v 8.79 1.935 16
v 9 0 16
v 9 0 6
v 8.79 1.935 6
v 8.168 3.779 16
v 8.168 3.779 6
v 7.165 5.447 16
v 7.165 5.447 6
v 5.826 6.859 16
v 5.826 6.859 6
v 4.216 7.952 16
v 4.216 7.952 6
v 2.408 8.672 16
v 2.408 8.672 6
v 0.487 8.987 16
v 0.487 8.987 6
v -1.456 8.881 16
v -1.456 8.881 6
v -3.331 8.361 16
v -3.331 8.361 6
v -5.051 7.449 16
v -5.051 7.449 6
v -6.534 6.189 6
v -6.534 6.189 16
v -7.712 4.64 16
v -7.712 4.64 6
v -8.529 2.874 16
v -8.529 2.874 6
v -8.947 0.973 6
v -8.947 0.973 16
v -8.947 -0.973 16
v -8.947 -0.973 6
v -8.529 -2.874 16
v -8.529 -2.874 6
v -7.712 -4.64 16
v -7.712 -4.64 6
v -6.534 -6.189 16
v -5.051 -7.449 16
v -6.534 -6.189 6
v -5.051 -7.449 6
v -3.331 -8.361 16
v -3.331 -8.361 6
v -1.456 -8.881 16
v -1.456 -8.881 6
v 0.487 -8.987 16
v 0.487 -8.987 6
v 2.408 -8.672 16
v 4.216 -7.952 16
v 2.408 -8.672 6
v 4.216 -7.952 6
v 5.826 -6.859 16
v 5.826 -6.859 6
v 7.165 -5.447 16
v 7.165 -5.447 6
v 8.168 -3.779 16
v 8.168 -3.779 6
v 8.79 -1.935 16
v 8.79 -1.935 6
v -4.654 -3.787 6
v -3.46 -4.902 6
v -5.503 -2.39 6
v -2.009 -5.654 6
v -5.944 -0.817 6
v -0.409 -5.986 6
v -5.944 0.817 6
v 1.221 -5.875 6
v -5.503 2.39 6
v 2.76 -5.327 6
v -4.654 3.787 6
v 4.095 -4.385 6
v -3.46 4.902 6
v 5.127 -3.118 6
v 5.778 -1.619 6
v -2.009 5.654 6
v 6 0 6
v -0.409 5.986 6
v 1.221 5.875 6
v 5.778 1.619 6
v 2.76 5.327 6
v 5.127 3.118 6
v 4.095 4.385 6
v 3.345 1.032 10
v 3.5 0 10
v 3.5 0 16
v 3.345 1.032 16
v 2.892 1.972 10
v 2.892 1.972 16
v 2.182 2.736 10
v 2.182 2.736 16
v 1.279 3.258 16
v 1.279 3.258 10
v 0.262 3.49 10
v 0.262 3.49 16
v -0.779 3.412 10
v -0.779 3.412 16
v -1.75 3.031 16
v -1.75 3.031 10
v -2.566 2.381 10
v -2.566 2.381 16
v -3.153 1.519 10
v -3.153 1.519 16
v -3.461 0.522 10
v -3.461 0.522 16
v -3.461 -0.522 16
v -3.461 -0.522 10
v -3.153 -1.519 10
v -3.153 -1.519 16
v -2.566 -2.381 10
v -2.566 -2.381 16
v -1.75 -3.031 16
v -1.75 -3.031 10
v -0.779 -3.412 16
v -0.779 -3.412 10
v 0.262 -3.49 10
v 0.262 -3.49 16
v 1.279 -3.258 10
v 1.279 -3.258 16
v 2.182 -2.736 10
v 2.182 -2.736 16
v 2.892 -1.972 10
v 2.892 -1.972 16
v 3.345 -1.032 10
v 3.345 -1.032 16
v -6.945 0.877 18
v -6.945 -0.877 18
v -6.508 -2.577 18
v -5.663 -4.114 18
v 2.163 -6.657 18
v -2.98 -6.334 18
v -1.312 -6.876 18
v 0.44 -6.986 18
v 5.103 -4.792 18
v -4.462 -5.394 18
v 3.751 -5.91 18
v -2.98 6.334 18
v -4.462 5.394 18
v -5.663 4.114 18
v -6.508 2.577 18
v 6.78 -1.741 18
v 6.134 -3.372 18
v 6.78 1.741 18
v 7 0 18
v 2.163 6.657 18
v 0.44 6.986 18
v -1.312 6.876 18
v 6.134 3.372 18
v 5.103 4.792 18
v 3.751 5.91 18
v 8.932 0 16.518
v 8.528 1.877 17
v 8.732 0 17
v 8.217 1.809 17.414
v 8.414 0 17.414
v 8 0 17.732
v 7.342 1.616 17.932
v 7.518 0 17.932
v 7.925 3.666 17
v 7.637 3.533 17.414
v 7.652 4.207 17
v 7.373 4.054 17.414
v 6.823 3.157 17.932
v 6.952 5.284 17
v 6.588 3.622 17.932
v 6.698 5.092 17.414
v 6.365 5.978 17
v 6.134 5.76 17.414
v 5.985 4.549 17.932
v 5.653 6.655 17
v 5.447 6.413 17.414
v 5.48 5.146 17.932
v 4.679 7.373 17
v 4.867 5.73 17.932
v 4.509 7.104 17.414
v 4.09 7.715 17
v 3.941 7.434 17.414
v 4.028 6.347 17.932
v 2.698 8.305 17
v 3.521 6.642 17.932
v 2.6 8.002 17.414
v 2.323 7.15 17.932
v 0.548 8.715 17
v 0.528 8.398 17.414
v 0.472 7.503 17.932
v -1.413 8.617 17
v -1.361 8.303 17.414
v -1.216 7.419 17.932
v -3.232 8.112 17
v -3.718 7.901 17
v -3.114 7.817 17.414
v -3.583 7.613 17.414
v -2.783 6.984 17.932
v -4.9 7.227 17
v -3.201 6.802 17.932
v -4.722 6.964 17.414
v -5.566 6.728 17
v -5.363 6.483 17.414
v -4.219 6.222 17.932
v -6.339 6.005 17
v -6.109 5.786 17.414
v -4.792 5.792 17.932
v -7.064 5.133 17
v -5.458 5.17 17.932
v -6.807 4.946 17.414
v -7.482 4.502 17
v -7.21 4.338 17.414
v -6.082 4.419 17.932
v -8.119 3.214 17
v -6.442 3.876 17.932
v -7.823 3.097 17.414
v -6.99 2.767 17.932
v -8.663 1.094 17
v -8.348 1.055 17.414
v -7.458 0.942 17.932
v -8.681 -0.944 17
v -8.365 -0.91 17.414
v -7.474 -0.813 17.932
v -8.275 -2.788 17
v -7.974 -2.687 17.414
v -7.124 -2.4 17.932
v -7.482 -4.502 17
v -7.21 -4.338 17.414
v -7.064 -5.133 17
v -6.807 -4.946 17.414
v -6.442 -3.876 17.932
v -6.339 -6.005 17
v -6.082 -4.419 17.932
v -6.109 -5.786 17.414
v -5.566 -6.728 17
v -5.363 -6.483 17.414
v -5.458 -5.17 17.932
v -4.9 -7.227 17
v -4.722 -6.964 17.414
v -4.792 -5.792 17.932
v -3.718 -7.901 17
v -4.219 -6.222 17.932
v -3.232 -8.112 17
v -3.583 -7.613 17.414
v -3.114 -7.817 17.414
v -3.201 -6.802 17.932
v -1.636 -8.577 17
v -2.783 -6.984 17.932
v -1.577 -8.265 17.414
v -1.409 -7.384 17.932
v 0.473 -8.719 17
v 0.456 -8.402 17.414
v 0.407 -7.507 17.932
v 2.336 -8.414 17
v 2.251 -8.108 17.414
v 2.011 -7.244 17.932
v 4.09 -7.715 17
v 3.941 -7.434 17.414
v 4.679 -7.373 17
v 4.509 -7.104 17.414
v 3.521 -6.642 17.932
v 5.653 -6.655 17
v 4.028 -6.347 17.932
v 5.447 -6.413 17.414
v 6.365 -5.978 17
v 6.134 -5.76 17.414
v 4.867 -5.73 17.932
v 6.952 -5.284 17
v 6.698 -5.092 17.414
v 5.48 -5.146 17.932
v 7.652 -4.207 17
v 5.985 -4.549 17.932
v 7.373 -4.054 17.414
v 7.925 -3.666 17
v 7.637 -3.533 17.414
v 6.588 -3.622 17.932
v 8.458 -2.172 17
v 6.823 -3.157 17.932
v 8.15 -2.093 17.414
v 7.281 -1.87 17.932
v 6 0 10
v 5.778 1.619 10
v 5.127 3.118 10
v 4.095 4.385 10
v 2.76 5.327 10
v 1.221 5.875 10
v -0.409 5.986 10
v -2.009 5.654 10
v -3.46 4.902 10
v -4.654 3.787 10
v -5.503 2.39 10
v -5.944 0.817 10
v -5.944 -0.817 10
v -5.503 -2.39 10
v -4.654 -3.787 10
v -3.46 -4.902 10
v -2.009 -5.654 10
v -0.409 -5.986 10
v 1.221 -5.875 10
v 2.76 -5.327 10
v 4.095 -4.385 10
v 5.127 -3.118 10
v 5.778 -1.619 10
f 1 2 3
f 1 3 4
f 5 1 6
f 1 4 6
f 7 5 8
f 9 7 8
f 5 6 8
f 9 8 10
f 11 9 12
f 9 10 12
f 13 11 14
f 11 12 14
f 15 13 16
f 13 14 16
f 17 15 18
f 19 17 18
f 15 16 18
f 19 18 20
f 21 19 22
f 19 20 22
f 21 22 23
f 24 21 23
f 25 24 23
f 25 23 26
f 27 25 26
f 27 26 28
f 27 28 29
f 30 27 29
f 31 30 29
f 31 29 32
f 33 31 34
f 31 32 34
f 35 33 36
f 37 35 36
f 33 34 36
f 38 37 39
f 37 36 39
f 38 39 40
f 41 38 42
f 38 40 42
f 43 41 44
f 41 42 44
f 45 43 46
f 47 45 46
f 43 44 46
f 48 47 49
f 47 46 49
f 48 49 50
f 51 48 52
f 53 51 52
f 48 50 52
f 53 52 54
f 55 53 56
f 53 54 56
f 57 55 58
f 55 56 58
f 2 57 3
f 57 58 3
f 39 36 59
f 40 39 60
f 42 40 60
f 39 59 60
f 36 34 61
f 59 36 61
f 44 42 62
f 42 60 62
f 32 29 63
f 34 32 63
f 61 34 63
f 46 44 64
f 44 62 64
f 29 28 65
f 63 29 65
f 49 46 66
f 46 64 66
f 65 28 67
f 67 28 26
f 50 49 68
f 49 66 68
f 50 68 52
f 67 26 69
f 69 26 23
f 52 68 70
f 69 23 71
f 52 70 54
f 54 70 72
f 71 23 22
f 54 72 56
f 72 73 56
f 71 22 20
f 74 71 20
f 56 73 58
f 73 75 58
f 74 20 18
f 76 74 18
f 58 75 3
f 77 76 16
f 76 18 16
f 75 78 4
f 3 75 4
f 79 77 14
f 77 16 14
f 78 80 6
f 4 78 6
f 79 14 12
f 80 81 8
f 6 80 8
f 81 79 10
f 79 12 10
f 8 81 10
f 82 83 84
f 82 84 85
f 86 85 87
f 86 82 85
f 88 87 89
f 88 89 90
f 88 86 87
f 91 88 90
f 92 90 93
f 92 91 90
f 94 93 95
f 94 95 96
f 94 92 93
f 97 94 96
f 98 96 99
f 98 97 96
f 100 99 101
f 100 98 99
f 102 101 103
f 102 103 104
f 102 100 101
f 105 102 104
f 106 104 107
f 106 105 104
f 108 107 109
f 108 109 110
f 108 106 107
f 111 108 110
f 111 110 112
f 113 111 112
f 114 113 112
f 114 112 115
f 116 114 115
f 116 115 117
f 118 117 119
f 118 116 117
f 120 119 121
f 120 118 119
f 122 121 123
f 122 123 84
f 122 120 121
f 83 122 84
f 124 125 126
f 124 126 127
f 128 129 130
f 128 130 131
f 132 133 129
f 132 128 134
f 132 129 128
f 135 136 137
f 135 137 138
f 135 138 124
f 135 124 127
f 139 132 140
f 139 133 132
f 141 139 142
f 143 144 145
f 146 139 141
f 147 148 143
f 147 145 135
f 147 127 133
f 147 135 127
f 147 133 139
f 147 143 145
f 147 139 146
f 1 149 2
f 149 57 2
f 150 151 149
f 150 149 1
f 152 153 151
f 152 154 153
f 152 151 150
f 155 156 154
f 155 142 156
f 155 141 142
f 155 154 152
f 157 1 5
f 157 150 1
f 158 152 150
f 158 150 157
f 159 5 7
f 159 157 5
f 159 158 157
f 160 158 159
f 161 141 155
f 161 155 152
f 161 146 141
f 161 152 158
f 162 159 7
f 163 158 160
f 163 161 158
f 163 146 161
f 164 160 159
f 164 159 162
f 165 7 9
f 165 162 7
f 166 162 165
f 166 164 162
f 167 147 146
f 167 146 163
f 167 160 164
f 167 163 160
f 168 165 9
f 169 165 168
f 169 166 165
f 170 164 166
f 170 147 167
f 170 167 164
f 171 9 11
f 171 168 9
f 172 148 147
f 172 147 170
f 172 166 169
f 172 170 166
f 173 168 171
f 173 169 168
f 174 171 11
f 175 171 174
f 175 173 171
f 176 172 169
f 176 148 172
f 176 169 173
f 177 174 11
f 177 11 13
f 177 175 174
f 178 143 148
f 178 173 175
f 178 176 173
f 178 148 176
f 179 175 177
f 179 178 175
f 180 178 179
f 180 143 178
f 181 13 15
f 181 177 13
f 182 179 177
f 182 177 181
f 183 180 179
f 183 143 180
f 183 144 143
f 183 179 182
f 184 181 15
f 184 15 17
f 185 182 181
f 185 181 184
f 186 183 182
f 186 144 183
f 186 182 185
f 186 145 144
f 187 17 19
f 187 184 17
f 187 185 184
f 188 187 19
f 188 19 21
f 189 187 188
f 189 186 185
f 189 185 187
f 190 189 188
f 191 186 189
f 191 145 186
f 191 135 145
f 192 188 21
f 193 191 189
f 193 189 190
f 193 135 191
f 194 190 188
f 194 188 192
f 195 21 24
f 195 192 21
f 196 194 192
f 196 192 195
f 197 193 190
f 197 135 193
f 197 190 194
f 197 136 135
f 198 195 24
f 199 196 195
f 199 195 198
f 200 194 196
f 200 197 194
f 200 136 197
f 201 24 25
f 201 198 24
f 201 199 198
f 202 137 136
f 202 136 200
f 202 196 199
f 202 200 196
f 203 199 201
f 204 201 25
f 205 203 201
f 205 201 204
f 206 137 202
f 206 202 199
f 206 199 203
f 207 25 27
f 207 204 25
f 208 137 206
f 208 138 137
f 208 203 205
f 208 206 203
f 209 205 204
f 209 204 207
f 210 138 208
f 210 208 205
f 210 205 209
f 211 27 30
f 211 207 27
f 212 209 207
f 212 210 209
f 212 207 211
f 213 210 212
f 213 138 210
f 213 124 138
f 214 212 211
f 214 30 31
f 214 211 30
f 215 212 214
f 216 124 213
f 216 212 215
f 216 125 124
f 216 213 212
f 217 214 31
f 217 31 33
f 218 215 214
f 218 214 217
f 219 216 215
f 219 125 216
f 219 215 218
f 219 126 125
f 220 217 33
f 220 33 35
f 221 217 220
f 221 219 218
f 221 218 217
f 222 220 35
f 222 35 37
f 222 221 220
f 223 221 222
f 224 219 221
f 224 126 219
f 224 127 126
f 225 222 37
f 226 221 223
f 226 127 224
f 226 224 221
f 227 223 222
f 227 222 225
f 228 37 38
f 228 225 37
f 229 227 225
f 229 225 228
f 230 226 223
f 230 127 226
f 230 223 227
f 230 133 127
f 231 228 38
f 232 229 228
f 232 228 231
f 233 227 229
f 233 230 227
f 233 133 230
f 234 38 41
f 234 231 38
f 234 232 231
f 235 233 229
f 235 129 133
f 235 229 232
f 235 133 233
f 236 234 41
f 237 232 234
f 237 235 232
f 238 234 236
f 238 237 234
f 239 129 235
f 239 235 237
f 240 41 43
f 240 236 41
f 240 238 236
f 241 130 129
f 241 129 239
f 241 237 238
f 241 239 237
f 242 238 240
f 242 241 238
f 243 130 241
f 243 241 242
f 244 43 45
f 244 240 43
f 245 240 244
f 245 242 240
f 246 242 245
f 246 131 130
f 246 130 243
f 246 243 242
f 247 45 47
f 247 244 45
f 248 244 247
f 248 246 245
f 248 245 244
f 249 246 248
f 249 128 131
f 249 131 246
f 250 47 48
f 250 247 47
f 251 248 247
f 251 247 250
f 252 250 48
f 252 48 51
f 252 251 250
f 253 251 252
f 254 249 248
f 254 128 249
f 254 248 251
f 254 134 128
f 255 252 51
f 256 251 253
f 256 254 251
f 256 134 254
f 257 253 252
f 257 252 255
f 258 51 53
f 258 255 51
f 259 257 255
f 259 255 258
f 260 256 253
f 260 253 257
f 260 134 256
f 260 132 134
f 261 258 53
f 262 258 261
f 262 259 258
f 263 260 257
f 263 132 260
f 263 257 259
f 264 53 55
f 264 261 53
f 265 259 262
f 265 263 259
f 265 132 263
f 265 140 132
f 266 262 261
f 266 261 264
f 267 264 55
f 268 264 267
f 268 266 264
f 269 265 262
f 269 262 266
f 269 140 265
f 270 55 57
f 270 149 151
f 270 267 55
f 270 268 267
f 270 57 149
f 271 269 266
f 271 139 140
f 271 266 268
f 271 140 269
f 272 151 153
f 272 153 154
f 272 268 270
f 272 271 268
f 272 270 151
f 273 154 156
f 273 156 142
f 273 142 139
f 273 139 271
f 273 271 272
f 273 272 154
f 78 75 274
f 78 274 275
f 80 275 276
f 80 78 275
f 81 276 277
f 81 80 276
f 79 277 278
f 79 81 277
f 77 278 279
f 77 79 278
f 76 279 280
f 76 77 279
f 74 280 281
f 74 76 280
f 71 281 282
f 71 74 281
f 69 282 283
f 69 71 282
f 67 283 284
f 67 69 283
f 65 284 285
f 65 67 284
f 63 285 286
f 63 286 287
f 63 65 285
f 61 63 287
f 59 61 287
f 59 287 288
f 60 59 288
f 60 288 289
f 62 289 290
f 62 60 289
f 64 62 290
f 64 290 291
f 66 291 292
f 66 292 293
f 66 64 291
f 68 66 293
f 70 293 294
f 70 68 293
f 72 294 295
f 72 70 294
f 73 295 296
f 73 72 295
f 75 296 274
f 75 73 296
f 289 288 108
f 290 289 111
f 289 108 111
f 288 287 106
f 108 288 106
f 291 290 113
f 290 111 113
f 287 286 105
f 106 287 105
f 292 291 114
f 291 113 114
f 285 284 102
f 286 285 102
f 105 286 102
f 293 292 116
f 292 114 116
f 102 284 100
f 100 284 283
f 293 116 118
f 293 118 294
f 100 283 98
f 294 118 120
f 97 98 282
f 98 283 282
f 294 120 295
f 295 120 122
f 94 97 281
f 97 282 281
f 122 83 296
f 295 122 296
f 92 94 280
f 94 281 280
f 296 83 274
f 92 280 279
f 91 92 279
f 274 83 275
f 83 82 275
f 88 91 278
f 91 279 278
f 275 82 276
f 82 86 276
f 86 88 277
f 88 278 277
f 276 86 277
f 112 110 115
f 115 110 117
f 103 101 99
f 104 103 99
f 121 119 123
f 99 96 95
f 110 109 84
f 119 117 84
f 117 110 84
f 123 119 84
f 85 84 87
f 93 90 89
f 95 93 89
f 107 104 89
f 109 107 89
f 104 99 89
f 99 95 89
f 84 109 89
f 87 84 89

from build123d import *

# Parameters (mm, degrees)
CYLINDER021_R     = 3.5
CYLINDER021_DEPTH = 6
CYLINDER017_R     = 6
CYLINDER017_DEPTH = 4
CYLINDER015_R     = 9
CYLINDER015_DEPTH = 12
FILLET012_R       = 2


with BuildPart() as knob_cut003:
    # Cylinder021 → Cylinder021 (new body)
    with BuildSketch(Plane.XY.offset(10)):
        Circle(CYLINDER021_R)
    extrude(amount=CYLINDER021_DEPTH)


with BuildPart() as knob_cut001:
    # Cylinder017 → Cylinder017 (new body)
    with BuildSketch(Plane.XY.offset(6)):
        Circle(CYLINDER017_R)
    extrude(amount=CYLINDER017_DEPTH)


with BuildPart() as knob003:
    # Cylinder015 → Cylinder015 (new body)
    with BuildSketch(Plane.XY.offset(6)):
        Circle(CYLINDER015_R)
    extrude(amount=CYLINDER015_DEPTH)

    # Cut020: cut KNOB_cut001
    add(knob_cut001.part, mode=Mode.SUBTRACT)

    # Cut021: cut KNOB_cut003
    add(knob_cut003.part, mode=Mode.SUBTRACT)

    # Fillet012
    fillet012_edges = [knob003.edges().sort_by_distance(p)[0] for p in [
        (-9, 0, 18),
    ]]
    fillet(fillet012_edges, radius=FILLET012_R)


solid = knob003.part
